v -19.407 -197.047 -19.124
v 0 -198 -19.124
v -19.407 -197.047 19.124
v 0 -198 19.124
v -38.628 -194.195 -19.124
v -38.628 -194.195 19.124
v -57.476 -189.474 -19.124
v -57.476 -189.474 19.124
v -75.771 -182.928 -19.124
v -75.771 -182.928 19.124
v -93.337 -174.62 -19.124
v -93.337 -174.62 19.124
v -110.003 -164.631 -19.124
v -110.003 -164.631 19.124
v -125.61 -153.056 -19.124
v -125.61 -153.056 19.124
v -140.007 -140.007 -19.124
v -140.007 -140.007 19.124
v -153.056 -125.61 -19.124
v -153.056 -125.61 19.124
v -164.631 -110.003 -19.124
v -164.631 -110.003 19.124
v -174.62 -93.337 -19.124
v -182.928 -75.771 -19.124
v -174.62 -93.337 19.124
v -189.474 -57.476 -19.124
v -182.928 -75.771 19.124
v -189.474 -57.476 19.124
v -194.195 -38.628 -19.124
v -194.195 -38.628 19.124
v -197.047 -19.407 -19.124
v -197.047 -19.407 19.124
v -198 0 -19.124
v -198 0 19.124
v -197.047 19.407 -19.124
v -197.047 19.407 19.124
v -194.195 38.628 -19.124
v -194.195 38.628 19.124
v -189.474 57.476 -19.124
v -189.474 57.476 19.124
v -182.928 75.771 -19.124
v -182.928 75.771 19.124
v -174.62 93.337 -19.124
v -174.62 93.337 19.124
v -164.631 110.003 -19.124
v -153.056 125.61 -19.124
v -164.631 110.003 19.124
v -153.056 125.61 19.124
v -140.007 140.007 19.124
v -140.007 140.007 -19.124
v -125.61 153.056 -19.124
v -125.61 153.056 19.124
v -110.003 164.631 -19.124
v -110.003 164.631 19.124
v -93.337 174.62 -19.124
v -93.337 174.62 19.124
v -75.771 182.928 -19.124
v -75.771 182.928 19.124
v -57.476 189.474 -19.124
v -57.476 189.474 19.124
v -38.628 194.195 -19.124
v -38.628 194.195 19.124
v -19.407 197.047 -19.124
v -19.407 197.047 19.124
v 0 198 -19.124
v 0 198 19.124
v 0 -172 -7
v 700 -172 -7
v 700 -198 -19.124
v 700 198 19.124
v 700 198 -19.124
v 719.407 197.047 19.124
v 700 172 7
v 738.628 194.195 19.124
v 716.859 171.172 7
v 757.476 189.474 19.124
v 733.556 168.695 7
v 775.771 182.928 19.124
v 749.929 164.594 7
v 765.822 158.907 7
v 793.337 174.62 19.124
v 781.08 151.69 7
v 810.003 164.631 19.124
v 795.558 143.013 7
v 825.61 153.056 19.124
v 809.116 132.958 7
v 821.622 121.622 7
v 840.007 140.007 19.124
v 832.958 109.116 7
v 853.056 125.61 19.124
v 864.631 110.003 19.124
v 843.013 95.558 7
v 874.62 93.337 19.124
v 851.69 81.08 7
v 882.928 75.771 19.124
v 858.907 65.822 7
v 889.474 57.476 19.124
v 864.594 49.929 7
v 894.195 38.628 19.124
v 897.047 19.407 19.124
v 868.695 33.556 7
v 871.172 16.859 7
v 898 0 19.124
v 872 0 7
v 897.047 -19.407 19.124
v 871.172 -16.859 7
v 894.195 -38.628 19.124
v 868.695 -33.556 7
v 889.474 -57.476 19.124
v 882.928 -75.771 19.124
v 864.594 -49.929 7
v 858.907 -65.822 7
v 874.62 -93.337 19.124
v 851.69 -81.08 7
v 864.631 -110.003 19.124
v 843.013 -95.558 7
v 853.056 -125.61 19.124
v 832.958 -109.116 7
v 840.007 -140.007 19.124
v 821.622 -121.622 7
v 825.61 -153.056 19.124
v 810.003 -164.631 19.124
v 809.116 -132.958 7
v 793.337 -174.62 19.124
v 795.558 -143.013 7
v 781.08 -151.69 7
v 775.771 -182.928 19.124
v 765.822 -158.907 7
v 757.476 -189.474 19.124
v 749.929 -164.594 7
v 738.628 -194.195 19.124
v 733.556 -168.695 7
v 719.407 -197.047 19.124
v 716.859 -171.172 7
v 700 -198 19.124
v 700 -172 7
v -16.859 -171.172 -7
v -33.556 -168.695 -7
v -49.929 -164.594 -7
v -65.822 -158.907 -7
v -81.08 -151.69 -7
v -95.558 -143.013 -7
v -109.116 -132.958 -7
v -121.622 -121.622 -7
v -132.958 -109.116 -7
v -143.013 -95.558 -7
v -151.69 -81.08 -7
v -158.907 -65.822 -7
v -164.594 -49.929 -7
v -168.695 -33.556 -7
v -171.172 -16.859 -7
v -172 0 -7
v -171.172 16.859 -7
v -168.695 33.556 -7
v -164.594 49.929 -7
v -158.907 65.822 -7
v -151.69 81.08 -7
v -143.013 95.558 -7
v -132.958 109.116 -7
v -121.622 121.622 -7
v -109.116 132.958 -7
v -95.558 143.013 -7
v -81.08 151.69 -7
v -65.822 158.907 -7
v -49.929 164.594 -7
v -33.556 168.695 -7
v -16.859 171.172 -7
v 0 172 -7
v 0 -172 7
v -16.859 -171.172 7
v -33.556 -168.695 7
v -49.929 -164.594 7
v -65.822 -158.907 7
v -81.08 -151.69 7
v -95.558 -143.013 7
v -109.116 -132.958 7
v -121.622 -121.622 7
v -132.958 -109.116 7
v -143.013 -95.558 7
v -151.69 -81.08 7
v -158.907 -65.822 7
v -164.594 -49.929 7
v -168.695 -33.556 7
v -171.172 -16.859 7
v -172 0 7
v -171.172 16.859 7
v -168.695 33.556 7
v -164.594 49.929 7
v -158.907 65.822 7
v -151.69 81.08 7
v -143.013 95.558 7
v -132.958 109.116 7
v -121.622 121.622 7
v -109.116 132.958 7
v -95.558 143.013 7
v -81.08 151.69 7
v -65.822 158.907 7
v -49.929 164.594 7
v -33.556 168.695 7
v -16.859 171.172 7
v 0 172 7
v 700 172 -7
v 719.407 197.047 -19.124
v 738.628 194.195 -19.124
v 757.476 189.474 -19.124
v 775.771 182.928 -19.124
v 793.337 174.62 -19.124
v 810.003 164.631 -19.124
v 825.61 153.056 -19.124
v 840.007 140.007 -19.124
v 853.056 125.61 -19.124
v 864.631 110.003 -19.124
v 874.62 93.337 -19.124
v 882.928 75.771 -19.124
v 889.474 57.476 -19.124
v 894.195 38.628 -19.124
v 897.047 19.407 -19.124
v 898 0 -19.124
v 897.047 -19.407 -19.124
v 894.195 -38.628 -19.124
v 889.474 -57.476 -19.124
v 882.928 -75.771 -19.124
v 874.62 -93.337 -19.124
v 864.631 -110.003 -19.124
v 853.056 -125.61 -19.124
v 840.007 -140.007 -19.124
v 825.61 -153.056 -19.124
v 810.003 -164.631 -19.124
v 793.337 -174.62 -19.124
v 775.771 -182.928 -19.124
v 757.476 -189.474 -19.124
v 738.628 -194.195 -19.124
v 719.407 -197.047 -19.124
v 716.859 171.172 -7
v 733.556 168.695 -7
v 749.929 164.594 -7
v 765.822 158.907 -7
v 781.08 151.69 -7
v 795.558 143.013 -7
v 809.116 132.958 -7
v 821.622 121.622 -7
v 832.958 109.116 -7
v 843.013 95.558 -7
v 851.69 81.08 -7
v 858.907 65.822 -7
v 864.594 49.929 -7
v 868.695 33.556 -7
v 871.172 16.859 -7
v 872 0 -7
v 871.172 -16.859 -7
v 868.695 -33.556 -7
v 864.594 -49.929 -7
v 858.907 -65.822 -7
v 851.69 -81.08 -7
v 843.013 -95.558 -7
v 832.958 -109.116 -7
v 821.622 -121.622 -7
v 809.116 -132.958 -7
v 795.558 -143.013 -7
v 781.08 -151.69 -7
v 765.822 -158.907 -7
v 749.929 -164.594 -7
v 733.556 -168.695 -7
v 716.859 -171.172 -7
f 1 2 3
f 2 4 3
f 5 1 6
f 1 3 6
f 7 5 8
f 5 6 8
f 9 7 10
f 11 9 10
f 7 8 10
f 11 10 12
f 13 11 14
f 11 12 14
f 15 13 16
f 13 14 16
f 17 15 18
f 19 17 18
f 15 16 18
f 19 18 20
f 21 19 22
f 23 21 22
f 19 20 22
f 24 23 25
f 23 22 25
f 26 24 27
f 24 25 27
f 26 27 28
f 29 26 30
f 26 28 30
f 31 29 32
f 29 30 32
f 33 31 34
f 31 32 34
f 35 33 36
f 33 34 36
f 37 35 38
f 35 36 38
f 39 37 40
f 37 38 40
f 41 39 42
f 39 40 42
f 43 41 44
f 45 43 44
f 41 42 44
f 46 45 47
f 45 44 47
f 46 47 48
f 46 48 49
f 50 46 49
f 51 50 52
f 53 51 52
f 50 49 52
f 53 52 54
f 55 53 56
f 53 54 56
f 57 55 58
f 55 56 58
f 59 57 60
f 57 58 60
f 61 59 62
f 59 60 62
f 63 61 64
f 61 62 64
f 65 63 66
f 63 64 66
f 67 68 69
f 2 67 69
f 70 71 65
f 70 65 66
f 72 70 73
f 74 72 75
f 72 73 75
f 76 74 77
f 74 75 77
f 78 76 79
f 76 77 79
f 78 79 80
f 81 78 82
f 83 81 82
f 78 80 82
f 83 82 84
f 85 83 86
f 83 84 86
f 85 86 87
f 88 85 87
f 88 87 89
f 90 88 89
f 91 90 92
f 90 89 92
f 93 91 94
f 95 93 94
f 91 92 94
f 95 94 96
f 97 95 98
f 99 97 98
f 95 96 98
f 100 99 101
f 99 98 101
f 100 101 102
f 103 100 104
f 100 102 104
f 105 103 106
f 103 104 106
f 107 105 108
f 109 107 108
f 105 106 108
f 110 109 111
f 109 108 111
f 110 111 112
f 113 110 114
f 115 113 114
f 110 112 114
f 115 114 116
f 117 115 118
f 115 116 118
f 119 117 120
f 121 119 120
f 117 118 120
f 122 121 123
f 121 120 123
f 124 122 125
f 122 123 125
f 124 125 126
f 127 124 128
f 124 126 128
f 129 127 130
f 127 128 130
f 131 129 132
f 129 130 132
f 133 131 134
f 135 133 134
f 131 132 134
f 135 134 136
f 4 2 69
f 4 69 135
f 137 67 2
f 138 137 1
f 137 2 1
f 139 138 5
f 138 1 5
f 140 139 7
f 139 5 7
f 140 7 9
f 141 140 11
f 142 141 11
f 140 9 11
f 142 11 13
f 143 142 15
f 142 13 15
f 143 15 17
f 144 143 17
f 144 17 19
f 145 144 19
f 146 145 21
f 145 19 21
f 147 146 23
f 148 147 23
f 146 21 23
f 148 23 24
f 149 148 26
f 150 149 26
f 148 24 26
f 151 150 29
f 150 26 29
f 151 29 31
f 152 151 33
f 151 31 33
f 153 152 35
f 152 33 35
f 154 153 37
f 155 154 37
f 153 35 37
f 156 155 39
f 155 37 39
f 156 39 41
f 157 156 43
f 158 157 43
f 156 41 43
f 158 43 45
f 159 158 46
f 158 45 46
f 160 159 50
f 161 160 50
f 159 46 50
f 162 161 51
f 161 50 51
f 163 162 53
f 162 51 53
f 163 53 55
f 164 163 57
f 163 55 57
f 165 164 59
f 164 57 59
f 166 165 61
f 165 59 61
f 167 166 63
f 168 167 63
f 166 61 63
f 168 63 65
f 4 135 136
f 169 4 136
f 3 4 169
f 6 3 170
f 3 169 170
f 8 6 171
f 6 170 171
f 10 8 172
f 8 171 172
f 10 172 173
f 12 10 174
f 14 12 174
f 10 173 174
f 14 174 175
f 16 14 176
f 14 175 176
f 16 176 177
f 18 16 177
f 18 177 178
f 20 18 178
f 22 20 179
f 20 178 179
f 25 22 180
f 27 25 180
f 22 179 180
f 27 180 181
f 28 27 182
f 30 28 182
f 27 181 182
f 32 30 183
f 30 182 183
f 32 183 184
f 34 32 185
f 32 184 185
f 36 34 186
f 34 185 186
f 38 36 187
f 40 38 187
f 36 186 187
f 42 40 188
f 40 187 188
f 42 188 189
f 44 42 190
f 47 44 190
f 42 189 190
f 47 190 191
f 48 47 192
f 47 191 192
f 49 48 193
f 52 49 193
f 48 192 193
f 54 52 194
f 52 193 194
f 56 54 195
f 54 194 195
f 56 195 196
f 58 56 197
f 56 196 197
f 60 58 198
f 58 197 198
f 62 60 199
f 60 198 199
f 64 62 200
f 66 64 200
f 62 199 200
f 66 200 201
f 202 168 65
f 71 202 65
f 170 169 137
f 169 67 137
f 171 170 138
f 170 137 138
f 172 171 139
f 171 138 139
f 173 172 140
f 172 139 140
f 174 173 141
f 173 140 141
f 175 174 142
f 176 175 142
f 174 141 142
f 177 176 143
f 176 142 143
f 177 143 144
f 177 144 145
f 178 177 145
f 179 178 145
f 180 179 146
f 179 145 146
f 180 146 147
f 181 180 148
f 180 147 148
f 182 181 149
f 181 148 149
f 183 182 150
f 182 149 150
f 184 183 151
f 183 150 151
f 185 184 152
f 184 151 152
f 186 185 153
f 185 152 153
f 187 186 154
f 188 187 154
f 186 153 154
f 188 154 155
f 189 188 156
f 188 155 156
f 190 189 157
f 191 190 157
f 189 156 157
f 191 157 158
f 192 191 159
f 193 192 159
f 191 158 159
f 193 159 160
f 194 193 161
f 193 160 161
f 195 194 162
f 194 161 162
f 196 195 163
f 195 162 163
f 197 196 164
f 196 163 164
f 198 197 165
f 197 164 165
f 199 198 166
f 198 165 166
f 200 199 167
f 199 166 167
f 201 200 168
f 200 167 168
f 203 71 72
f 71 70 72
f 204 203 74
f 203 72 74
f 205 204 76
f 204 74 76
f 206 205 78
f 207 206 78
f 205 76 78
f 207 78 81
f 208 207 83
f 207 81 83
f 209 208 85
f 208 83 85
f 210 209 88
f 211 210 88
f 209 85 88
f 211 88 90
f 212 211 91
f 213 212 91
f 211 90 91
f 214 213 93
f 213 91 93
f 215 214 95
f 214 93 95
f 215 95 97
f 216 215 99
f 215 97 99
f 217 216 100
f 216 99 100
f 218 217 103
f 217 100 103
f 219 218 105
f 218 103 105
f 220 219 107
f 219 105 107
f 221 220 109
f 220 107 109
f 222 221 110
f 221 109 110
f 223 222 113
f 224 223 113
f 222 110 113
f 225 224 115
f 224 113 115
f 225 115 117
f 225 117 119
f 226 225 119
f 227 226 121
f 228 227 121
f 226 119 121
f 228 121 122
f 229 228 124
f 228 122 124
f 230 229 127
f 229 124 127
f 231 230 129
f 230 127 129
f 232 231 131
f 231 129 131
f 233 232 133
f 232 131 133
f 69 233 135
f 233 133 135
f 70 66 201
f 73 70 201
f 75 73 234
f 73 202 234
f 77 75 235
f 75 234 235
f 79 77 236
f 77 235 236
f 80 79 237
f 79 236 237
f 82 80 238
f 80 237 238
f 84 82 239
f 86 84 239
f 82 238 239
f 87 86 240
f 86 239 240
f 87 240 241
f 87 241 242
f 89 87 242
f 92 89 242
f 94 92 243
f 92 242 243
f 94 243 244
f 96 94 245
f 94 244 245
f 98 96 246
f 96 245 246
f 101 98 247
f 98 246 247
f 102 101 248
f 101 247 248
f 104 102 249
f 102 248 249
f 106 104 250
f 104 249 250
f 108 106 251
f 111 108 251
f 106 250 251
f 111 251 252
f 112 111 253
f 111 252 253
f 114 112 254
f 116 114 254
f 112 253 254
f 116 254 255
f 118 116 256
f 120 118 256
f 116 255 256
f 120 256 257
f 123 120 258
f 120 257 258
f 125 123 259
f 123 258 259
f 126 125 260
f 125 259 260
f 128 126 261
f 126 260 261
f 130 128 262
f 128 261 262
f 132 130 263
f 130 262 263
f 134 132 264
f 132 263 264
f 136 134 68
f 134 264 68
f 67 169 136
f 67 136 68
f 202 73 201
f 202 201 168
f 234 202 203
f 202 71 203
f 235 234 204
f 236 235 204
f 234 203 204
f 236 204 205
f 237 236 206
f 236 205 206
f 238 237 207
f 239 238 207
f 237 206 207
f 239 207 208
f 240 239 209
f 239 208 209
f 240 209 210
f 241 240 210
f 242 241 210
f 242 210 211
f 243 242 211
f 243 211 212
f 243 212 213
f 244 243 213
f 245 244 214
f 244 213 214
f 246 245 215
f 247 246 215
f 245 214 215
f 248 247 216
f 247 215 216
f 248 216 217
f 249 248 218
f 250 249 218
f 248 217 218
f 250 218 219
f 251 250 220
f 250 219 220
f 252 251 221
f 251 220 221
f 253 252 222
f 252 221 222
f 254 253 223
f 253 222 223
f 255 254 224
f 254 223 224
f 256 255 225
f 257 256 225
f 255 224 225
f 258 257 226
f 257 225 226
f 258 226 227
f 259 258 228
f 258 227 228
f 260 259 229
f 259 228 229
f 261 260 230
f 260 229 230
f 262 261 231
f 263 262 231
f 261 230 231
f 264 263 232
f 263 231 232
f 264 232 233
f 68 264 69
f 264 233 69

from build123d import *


with BuildPart() as part:
    # Barrer1: sweep along a path in Croquis2
    with BuildLine(Plane.XY) as barrer1_path:
        Line((0, 172), (700, 172))
        ThreePointArc((700, 172), (872, 0), (700, -172))
        Line((700, -172), (0, -172))
        ThreePointArc((0, -172), (-172, 0), (0, 172))
    # Croquis3 → Barrer1 (sweep)
    with BuildSketch(Plane(origin=(0, 0, 0), x_dir=(0, 0, -1), z_dir=(1, 0, 0))):
        Polygon((-7, 172), (7, 172), (19.123999112, 198), (-19.123999112, 198), align=None)
    sweep(path=barrer1_path.line)


solid = part.part
